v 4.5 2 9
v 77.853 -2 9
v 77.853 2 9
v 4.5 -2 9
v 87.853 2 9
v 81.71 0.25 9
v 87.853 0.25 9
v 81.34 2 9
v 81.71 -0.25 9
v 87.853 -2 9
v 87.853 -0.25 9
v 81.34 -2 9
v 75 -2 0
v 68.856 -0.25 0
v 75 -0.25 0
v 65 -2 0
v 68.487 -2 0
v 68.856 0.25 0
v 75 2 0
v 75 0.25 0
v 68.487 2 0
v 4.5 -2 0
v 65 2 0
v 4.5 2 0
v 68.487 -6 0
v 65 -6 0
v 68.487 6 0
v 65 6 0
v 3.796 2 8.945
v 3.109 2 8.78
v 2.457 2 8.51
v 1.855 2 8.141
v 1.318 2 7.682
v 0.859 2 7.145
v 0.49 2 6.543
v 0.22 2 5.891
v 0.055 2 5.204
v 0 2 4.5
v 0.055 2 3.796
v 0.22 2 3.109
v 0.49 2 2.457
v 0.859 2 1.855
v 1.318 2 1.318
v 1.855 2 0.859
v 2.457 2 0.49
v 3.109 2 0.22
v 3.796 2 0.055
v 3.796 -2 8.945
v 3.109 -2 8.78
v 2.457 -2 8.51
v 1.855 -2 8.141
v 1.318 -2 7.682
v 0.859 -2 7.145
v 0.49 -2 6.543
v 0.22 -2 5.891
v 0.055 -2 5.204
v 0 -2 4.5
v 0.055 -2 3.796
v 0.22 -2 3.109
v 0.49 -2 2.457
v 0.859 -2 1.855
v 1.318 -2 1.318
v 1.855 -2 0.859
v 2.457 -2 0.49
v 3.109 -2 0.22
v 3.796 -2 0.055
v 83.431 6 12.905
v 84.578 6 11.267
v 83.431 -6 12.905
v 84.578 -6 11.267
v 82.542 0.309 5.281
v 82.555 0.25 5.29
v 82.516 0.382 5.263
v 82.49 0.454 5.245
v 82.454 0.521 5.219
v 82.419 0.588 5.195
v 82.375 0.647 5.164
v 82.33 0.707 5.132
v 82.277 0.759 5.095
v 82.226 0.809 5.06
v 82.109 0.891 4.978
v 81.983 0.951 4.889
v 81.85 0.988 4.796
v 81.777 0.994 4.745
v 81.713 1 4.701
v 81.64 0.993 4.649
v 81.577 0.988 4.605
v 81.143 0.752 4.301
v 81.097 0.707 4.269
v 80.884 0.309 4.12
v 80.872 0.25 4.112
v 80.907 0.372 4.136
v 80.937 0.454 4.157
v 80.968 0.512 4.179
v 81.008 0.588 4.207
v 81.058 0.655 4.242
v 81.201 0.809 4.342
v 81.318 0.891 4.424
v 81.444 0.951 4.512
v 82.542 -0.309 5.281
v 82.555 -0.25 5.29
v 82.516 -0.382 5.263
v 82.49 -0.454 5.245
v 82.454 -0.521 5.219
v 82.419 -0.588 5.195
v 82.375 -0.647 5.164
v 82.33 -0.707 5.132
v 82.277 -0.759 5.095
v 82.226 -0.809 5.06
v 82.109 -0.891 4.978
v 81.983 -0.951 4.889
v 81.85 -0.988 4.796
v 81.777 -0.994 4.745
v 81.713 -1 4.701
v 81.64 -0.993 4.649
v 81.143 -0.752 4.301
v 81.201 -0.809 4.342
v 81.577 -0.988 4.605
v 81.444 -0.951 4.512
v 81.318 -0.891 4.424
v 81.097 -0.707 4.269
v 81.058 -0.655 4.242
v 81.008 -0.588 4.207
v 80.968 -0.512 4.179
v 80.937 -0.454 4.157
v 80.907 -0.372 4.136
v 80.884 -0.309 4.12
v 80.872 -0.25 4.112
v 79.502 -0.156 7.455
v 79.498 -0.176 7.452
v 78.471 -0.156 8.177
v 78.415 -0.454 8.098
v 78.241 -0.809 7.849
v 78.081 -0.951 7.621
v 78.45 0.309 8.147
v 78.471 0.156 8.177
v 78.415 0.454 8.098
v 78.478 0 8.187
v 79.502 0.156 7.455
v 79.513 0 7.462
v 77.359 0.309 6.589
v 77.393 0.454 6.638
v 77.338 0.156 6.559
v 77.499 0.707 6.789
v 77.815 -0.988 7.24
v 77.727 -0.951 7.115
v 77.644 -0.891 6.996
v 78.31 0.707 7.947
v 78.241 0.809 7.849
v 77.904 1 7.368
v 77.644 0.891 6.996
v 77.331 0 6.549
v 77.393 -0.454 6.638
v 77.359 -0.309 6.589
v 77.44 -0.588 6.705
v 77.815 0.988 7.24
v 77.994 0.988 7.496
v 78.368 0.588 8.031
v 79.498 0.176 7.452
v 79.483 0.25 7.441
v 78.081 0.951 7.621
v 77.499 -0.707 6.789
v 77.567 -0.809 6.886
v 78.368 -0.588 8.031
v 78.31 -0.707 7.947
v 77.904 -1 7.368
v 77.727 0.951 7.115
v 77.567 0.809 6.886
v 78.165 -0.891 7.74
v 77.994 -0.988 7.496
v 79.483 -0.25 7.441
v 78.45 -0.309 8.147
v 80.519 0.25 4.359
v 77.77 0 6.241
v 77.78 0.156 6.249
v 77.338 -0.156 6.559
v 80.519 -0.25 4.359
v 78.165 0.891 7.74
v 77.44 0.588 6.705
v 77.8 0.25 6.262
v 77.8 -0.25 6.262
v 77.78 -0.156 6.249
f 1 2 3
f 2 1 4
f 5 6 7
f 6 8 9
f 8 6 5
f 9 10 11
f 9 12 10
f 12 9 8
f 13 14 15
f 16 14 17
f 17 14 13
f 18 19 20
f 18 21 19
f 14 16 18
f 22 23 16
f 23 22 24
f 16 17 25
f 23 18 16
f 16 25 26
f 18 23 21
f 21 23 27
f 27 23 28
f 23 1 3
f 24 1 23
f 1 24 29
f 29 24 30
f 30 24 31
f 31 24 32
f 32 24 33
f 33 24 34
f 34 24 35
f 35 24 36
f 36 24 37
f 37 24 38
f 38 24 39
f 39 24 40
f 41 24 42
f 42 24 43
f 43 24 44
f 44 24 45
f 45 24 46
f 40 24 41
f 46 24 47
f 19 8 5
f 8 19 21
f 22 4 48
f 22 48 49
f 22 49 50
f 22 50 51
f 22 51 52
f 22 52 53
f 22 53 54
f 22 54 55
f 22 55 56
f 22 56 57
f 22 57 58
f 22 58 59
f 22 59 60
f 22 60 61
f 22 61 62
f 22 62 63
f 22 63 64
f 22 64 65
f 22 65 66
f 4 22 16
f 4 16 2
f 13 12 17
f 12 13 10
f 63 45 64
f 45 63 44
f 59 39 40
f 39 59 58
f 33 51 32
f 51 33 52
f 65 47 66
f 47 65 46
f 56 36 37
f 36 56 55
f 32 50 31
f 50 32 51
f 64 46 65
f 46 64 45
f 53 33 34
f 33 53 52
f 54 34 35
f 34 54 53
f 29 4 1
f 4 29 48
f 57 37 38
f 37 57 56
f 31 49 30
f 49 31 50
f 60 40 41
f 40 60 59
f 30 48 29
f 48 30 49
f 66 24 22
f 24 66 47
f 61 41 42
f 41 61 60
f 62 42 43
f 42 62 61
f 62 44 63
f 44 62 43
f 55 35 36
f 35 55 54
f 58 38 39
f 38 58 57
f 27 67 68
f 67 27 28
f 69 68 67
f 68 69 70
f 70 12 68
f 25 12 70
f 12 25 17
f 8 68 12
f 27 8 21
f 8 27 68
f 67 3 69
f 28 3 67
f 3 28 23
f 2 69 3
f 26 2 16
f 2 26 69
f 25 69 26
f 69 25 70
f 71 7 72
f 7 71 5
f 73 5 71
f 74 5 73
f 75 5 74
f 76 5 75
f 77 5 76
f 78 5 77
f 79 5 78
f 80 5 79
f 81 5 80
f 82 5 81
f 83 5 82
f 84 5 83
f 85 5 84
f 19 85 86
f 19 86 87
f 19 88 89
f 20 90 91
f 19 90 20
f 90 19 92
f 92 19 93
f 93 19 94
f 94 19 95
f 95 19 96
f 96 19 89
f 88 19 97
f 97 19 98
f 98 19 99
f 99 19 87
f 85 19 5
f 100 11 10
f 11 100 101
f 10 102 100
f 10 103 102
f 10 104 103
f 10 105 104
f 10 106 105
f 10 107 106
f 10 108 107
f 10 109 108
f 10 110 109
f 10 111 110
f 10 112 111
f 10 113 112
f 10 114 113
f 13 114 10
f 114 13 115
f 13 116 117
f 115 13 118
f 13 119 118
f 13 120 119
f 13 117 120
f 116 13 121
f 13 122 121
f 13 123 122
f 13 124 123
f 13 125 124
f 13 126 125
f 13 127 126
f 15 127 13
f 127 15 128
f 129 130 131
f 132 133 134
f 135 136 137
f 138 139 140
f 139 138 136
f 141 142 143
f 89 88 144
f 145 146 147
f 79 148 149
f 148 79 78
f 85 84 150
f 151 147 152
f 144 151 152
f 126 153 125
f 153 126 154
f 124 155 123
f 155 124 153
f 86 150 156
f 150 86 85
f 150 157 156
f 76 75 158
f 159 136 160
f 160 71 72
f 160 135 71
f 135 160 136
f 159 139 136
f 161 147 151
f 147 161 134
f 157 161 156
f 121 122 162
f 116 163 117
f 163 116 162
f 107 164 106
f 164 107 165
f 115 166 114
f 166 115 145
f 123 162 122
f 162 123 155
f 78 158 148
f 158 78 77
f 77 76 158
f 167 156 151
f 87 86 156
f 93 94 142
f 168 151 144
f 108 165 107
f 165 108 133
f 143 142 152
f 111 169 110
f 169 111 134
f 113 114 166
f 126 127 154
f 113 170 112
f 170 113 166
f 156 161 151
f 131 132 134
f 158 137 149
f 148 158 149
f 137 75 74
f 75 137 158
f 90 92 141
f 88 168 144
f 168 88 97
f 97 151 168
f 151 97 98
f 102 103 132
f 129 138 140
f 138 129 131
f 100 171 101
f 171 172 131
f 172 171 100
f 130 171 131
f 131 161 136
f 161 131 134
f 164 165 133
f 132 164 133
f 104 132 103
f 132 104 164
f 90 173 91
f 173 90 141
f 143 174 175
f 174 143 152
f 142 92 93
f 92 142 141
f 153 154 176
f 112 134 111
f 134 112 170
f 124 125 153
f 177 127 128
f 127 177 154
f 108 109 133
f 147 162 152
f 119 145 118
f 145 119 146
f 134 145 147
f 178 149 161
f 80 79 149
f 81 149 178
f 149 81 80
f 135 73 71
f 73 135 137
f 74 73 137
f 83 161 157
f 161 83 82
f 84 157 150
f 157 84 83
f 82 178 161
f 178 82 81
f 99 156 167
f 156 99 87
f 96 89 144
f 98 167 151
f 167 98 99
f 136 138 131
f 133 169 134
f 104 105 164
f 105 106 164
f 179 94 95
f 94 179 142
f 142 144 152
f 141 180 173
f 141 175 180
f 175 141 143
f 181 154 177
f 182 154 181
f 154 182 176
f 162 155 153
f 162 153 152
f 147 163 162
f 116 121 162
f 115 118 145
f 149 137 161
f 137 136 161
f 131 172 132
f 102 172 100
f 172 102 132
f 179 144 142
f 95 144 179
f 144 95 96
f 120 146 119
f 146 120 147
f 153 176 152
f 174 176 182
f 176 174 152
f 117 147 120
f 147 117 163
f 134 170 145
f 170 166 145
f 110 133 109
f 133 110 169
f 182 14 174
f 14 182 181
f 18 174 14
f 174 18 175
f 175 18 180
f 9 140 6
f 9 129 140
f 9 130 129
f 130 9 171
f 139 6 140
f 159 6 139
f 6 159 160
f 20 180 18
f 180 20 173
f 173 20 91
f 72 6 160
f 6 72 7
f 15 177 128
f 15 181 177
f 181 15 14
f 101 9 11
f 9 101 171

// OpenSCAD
// file: vars.scad
// FRAME = The outer dimension of the matte and backing board
//         (Use the inner dimension of the wooden frame as the basis, but remove 0.5-1mm for wiggle room)

// PANEL = The size of the electronic board with the screen
//         (Measure it or get it from the manufacturer's website)

// VIEWPORT = The size of portion that has the pixels to be shown
//           (Best to start with the manufacturer's website - might need a tad modified)

// PIN = The four round holes/pins that connect the matte to the backboard

// BOX = The container for the electronics behind the frame (part of the backing board)

// RIBBON (CUTOUT) = The ribbon cable that goes to the eInk display.  
//				     Cutout = the space to go between the matte and the backing board

// TAB = The connectors that keep the back/matte into the wooden frame (1 stationary, 3 moving tabs)


// All numbers (length/width/etc.) are in millimeter

frame_width = 176; // 6 7/8" + 1mm
frame_height = 126;  // 4 7/8" + 2mm

matte_depth = 3; // was 3 mm (2.75mm is too thin)

backboard_depth = 3; // 3mm

panel_width = 170.2 + 1;// add a 1mm clearance
panel_height = 111.2 + 1;// add a 1mm clearance
panel_depth = 2.25;

viewport_width = 163.2 + 2; 
viewport_height = 97.92 + 2; 

viewport_to_panel_width_offset = 0;
viewport_to_panel_height_offset = -3;

ribbon_cutout_width = 25; // width of cutout for ribbon cable
ribbon_cutout_height = 2;
ribbon_cutout_width_offset = 1;  // + = move right, - = move left (looking from the back)

ribbon_slot_height = 6;

// Alignment pins (which line up the matte with the back board)
pin_width = 3;
pin_offset = 3.5;
pin_up = 3;
pin_back_indent = 3;  // Indent the back pins so that there is only one way the two sides match

// The electronics box (mounted on the back board)
box_width = 140;
box_height = 100;
box_depth  = 23;
box_thickness = 2;

box_corner_post_radius = 5;
box_screw_head_diameter = 5;
box_screw_diameter = 3;

frame_to_box_height_offset = 6;

// Tab - goes into the slot of the frame
backboard_tab_width = 60;
backboard_tab_height = 2.5;
backboard_tab_depth = 1;

// Movable tabs - the round pins connecting the three other sides (beyond the primary tab)
movable_tab_width = 6;
movable_tab_offset = 8;
movable_tab_depth = 4;


// Power Cord cutout (the place where the power cord goes)
power_cord_slot_diameter = 5; // 5mm space for the cable
power_cord_slot_height   = 6; // 10mm of vertical spacing for the slot
power_cord_slot_offset = 30;  // How far the power cord cutout is from the bottom

// Standoffs (for electronic boards)
standoff_screw_diameter = 2.5;
standoff_depth = 4.5;


// backplate
backplate_depth = 4;
backplate_pocket_depth = 1.5;

// stand
stand_angle = 55;
stand_length = 90;  // the size (length) of the rectangular "rod" (was 100)
stand_width = 4;     // the size of the rectangular "rod"
stand_height = 9;    // the size of the rectangular "rod"

// Control how "good" the circles are
$fn = $preview ? 20 : 40;


// Computed items below
frame_bottom_border_height = (frame_height - panel_height)/2 + viewport_to_panel_height_offset;
frame_top_border_height    = (frame_height - panel_height)/2 - viewport_to_panel_height_offset;
pin_height = backboard_depth;

latch_width =  2 * movable_tab_width;
// main file
include <vars.scad>

screw_width = 2;

function height_to_rod_len (h) = 
    h / cos(stand_angle);
    
module rod () {
    r = stand_height / 2;
    
    translate([r, -stand_width/2, 0])
        cube([stand_length-r, stand_width, stand_height]);
    
    translate([r, 0, r])
        rotate([90, 0, 0])
          cylinder(h=stand_width, r=r, center=true);
    };
    
module flatten_foot() {
    
  x1 = stand_height * tan(90-stand_angle);
  
  translate([0, stand_width, 0])
    rotate([90,0,0])
        linear_extrude(stand_width * 2)
            polygon([[0,0], [0, stand_height], [x1, 0]]);
  };
    
module rod_stop() {
    stop_width = stand_width * 3;  // was 4
    stop_height = stand_height * 2.5; // was 2.75
    
    translate([stand_length - 25, -stop_width/2, 0]) 
        rotate([0, stand_angle, 0])
            cube([2, stop_width, stop_height]);
    };

module remove_end() {
    translate([stand_length - 15, -stand_width/2, 0]) 
        rotate([0, stand_angle, 0])
            cube([20, stand_width, stand_height * 2]);
    };

// TODO: FIXME:  This is a HACK
module screw_hole() {
   translate([stand_length - 8, 0, stand_height * 0.5])
        rotate([0, -stand_angle, 0])
            cylinder(d=screw_width, h=10, center=true);
   };

module expansion_slot() {
   translate([stand_length-24, 0, -2]) 
        translate([0, -0.25, 0]) // center on y
            rotate([0, stand_angle, 0])
                cube([12, 0.5, stand_height * 2.7]);
    };

// Remove all material below the z-axis
module remove_below() {
    translate([-10,-20,-10])
        cube([200, 40, 10]);
    };


module thru_hole(x, h, w) {
    d = 1.85; // A little bigger than a 1.75mm filament
    
    translate([x, 0, h/2])
        rotate([90, 0, 0])
            cylinder(d=d, h=w, center=true);
    };

module stand() {
    difference() {
        union() {
            rod_stop();
            rod();
            };
            
        // flatten_foot();
        //thru_hole(stand_length-5, stand_height, stand_width);  // was -4
        remove_end();
        screw_hole(); 
        #expansion_slot();
        remove_below();
        };
    };
    
 stand();
